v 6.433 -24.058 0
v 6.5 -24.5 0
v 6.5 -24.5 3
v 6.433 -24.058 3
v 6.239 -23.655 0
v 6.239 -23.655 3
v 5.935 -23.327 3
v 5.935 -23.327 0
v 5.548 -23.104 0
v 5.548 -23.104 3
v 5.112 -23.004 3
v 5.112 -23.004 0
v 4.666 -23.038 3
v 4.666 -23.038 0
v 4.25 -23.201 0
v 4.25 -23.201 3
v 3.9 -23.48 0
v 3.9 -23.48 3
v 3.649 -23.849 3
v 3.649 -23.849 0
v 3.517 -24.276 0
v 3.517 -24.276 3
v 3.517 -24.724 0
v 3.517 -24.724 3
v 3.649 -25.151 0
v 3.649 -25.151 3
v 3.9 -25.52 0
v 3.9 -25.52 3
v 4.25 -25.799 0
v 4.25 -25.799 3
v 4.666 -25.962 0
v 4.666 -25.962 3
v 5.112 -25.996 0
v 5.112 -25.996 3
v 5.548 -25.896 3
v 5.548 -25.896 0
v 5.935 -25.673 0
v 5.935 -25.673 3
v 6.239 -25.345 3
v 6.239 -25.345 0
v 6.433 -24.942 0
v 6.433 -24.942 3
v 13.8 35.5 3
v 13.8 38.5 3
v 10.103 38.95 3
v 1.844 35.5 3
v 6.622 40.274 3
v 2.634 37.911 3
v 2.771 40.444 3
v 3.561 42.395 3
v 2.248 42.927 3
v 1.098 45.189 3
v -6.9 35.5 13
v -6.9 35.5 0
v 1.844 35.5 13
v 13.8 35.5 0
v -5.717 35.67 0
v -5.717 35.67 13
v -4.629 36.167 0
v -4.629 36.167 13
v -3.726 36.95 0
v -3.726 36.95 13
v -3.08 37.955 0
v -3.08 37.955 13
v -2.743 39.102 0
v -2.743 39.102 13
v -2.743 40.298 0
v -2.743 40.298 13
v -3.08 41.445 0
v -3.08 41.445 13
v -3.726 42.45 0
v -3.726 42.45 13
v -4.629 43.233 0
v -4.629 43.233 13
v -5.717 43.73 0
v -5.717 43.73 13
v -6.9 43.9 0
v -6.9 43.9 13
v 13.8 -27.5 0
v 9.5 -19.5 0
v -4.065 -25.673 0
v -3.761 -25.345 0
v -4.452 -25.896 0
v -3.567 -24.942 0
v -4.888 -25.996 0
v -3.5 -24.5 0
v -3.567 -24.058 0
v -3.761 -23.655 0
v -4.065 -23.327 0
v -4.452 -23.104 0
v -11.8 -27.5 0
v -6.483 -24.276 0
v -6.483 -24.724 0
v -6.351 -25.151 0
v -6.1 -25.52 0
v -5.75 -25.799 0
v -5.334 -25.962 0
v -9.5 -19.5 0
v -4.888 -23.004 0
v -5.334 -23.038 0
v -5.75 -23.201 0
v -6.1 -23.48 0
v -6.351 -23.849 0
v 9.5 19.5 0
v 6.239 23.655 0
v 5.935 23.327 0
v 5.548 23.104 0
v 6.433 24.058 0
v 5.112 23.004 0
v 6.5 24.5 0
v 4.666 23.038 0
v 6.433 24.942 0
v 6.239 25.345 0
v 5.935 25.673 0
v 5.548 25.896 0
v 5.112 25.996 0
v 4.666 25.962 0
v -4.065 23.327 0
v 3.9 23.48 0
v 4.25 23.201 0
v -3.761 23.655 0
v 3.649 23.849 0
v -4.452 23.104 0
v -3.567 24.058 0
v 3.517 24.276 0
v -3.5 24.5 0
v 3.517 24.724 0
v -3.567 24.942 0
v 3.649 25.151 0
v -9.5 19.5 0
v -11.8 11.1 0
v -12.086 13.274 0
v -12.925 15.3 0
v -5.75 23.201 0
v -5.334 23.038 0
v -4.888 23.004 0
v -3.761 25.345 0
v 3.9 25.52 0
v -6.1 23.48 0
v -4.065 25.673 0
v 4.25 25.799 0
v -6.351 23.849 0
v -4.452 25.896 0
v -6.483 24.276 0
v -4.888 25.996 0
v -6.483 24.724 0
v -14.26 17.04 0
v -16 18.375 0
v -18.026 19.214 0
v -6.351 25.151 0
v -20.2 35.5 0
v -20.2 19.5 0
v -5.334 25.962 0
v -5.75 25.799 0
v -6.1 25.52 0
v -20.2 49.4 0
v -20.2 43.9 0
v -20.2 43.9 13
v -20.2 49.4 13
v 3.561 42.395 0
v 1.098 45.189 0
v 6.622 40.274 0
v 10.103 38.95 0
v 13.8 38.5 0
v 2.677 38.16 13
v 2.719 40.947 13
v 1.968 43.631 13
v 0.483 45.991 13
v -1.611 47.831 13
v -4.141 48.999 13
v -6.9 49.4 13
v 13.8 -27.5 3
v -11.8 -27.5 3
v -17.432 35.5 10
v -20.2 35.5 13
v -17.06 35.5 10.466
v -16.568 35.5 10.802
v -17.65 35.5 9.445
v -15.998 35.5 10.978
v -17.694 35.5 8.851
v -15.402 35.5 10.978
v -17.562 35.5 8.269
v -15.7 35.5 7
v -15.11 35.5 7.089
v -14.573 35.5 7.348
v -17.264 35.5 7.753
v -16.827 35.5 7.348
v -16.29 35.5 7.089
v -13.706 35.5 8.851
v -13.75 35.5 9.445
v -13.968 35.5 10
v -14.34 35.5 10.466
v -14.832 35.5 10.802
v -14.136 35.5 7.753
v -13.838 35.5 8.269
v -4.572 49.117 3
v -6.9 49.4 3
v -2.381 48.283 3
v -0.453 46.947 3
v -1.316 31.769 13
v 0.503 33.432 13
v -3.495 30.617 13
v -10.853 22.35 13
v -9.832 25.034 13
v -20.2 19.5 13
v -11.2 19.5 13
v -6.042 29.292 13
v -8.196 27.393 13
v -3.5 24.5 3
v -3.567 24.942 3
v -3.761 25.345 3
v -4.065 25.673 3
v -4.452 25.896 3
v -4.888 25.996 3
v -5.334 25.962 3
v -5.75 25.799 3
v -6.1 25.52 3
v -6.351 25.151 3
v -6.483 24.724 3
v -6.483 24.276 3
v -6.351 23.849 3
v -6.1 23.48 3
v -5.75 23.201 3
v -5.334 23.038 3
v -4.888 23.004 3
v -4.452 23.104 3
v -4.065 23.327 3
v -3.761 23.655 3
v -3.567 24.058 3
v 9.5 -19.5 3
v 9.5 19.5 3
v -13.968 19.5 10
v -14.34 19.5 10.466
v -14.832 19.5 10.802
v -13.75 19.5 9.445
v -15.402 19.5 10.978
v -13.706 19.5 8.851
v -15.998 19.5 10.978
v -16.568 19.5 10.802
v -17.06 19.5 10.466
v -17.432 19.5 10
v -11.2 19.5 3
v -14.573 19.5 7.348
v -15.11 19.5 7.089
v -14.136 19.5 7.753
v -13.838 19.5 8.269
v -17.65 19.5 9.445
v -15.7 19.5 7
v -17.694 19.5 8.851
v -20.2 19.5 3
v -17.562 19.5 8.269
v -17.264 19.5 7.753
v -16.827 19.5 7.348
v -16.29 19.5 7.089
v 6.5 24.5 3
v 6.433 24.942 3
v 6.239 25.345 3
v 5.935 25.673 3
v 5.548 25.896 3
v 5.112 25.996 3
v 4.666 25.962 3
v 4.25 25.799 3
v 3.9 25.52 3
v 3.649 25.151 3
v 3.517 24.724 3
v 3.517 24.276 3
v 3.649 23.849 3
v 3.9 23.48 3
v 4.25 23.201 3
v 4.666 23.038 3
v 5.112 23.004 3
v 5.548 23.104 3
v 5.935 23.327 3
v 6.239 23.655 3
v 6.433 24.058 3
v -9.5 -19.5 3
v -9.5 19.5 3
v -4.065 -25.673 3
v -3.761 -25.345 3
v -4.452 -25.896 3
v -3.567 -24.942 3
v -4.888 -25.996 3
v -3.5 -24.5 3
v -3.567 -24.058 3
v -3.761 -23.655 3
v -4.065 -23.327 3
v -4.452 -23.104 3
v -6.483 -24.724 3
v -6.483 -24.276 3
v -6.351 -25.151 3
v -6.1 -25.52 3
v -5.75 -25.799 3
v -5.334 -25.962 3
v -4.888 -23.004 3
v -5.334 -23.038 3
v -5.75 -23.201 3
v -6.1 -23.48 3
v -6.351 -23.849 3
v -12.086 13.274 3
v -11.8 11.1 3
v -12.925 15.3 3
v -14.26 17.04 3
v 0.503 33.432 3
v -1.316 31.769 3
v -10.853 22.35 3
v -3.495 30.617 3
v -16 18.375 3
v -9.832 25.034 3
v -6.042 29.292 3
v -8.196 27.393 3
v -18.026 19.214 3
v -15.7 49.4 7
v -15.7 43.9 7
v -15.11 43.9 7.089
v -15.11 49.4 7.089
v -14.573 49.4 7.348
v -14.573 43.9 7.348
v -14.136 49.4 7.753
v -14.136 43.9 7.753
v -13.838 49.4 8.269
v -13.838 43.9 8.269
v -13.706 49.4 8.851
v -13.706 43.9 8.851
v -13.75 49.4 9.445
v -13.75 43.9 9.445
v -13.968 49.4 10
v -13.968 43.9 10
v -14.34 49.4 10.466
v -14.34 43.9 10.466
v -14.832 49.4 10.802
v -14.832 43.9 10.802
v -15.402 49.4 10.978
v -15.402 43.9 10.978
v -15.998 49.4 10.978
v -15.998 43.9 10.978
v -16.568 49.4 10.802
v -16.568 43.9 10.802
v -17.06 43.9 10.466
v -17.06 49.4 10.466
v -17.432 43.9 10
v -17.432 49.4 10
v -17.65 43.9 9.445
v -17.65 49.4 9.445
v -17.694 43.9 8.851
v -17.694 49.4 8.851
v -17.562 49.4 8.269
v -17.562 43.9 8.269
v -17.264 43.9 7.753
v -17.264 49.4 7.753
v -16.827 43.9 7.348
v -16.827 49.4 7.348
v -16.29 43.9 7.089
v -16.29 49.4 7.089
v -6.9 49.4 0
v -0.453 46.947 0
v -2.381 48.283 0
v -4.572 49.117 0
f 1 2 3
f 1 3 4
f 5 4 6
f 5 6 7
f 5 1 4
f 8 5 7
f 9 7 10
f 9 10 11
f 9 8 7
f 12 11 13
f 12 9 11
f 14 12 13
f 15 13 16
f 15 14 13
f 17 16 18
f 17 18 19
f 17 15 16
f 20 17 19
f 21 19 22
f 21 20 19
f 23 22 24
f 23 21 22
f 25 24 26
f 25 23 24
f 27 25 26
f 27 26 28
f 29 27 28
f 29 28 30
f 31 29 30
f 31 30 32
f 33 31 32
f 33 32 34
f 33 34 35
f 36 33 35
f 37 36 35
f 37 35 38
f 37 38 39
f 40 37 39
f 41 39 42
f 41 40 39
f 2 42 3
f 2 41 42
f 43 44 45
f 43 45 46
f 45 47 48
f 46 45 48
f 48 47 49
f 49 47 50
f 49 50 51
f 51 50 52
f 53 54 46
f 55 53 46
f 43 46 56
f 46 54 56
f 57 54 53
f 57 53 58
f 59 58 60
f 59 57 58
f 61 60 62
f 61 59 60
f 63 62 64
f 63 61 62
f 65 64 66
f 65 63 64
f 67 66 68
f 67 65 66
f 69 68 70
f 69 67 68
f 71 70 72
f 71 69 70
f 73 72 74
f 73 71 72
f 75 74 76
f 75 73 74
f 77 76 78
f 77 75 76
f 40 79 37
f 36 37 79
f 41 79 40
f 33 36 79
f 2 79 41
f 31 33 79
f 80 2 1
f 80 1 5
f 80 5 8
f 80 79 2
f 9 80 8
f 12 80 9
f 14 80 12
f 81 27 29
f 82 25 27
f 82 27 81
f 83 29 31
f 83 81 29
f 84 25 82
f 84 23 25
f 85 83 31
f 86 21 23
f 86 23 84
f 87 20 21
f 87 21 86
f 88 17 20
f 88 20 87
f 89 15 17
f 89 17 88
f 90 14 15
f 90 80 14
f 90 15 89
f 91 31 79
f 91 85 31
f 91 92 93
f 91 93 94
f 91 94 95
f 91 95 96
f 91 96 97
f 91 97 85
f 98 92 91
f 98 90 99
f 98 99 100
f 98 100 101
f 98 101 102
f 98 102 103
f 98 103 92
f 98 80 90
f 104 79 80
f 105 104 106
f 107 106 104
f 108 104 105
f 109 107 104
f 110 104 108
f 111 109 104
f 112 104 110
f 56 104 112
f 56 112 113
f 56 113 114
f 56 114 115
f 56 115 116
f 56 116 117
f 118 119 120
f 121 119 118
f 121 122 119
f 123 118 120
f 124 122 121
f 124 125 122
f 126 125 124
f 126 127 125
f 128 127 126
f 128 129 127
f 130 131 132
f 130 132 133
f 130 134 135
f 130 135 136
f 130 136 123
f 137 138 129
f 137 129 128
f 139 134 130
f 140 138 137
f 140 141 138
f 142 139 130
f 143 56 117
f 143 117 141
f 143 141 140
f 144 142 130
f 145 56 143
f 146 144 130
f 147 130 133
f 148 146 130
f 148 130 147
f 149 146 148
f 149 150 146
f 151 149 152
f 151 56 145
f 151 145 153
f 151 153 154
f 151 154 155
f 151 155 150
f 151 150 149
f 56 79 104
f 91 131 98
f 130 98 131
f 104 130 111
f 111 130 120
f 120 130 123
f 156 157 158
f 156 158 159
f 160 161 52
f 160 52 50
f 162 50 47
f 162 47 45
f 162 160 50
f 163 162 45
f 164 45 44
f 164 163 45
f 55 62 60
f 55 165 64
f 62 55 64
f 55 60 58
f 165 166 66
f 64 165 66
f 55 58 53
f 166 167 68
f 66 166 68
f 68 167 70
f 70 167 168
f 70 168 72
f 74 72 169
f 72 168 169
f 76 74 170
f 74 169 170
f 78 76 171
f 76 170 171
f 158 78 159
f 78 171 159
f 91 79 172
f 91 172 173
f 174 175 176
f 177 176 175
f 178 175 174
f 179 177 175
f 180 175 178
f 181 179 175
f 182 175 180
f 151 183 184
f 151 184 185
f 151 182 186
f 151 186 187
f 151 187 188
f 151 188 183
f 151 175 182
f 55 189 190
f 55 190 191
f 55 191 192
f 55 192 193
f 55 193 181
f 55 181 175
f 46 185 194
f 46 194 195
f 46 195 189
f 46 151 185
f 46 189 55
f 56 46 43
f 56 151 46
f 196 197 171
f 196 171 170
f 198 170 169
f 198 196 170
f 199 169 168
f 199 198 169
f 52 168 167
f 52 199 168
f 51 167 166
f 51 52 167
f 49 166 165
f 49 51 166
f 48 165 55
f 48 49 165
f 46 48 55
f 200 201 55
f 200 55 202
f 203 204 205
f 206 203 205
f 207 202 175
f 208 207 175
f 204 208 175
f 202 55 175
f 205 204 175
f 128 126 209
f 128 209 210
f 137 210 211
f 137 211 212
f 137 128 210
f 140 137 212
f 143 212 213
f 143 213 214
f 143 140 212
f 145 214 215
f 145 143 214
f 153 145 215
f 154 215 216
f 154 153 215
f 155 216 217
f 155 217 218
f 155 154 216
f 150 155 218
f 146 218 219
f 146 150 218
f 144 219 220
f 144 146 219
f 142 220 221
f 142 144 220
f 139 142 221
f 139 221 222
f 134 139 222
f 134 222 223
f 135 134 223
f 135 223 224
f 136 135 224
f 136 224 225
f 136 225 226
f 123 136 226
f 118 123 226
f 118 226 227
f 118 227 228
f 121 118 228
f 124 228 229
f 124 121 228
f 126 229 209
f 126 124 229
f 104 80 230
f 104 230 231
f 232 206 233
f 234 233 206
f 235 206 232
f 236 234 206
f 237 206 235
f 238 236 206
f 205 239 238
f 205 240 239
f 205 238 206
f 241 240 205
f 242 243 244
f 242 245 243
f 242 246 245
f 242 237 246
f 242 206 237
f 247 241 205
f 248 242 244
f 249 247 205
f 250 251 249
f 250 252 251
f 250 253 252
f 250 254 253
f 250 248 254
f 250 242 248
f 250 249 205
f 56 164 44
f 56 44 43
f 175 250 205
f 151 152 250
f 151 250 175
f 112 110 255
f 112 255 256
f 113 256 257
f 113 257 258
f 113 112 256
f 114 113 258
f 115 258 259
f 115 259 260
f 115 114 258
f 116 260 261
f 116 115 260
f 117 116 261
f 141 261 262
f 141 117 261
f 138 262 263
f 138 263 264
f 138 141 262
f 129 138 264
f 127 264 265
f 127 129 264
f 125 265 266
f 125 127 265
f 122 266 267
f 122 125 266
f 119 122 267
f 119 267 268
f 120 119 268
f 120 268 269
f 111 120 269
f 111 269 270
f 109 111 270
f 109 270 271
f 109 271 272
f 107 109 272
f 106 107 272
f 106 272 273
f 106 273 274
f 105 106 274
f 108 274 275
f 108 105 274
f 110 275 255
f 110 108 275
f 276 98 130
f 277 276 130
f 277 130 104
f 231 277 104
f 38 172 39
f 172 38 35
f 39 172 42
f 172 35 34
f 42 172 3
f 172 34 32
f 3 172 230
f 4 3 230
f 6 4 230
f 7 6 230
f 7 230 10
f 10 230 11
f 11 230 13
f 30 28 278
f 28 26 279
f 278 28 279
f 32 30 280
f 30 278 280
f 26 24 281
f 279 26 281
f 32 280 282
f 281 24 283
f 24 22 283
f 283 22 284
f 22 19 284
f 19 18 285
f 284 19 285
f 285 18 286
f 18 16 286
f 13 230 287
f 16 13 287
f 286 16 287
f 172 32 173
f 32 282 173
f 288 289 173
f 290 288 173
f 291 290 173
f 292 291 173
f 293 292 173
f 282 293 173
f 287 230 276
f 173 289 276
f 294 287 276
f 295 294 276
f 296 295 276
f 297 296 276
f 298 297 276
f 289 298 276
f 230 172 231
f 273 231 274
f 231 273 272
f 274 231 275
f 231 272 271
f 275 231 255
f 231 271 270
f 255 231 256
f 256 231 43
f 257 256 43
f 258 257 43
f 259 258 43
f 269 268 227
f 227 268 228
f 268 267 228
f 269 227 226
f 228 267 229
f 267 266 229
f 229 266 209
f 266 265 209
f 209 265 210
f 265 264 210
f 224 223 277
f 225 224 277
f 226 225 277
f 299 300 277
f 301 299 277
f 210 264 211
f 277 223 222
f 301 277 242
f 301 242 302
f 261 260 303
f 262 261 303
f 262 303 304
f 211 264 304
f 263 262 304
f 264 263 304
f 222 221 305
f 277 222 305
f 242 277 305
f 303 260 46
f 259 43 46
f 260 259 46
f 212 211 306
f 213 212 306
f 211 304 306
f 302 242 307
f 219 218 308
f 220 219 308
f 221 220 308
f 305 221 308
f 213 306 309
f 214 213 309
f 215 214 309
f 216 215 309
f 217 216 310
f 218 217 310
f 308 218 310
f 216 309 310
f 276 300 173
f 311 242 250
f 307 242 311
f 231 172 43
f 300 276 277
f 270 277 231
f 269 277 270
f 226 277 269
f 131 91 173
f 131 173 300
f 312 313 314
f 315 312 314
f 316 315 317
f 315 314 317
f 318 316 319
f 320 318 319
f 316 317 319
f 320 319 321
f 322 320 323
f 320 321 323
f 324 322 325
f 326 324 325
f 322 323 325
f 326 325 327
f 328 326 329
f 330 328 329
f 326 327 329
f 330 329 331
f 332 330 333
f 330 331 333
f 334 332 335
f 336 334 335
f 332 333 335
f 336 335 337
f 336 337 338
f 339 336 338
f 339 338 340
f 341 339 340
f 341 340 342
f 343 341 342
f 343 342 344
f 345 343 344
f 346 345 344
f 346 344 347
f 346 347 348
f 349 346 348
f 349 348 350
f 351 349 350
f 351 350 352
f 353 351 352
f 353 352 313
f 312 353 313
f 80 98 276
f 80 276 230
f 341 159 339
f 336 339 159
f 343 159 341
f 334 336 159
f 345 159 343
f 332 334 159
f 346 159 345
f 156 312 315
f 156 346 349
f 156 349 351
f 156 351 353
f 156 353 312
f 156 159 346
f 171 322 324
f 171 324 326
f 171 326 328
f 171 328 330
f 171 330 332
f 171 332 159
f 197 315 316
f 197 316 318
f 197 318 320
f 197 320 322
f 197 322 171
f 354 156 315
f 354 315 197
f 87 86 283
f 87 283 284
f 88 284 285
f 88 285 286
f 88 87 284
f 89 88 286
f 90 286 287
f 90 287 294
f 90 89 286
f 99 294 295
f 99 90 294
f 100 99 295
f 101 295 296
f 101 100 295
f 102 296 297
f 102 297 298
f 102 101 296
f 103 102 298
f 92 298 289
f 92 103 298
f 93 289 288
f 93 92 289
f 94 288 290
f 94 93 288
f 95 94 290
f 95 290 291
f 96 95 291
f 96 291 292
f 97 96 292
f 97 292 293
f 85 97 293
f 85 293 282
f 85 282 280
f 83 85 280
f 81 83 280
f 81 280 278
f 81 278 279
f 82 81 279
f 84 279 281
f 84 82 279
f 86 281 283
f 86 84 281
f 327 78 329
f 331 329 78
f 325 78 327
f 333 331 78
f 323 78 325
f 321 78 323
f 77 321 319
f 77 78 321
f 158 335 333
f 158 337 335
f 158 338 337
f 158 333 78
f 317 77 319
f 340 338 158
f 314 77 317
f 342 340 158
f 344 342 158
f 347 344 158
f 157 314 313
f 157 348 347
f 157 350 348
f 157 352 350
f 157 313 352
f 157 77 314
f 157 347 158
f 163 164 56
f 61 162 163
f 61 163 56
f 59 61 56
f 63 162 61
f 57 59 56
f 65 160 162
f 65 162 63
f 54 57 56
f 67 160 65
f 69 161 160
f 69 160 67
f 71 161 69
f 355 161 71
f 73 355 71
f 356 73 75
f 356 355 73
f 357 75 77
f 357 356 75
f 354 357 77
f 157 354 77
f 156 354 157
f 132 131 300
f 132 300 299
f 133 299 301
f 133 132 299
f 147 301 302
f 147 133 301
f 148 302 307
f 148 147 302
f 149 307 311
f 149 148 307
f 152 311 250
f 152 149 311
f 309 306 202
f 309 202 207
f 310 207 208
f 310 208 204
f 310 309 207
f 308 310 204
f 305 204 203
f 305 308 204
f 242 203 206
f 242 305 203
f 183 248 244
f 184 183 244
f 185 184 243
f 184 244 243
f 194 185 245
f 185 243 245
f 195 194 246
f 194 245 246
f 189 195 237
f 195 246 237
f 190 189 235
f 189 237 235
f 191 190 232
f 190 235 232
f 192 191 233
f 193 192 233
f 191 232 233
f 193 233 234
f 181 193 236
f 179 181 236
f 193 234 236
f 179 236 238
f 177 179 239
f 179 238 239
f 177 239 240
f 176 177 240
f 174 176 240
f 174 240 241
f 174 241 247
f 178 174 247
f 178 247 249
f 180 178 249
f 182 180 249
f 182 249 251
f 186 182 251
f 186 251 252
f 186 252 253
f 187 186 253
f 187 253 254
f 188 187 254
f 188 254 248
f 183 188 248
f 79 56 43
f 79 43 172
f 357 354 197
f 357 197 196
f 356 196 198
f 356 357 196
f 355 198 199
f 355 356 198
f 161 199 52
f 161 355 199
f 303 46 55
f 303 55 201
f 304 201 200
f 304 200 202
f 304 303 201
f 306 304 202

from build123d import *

# Parameters (mm, degrees)
SKETCH_1_R             = 1.5
SKETCH_1_W             = 19
SKETCH_1_H             = 39
EXTRUDE_894_DEPTH      = 3
EXTRUDE_1415_DEPTH     = 10
CUT_EXTRUDE_1608_REACH = 54.783
SKETCH_3_R             = 2


# Read off the part's stored shape, not the designer's step: Разделить1
with BuildPart() as part:
    # Эскиз1 → Extrude 894 (new body)
    with BuildSketch(Plane.XY):
        with BuildLine():
            Line((-20.2, 19.5), (-20.2, 35.5))
            Line((-20.2, 35.5), (-6.9, 35.5))
            ThreePointArc((-6.9, 35.5), (-2.7, 39.7), (-6.9, 43.9))
            Line((-6.9, 43.9), (-20.2, 43.9))
            Line((-20.2, 43.9), (-20.2, 49.4))
            Line((-20.2, 49.4), (-6.9, 49.4))
            ThreePointArc((-6.9, 49.4), (-2.380550811, 48.282807176), (1.097847616, 45.188572995))
            ThreePointArc((1.097847616, 45.188572995), (6.622227297, 40.274321564), (13.8, 38.5))
            Line((13.8, 38.5), (13.8, -27.5))
            Line((13.8, -27.5), (-11.8, -27.5))
            Line((-11.8, -27.5), (-11.8, 11.1))
            ThreePointArc((-11.8, 11.1), (-14.260303038, 17.039696962), (-20.2, 19.5))
        make_face()
        with Locations((-5, 24.5)):
            Circle(SKETCH_1_R, mode=Mode.SUBTRACT)
        with Locations((5, 24.5)):
            Circle(SKETCH_1_R, mode=Mode.SUBTRACT)
        with Locations((-5, -24.5)):
            Circle(SKETCH_1_R, mode=Mode.SUBTRACT)
        with Locations((5, -24.5)):
            Circle(SKETCH_1_R, mode=Mode.SUBTRACT)
        Rectangle(SKETCH_1_W, SKETCH_1_H, mode=Mode.SUBTRACT)
    extrude(amount=EXTRUDE_894_DEPTH)

    # Эскиз2 → Extrude 1415 (add)
    with BuildSketch(Plane.XY.offset(3)):
        with BuildLine():
            Line((-20.2, 19.5), (-20.2, 35.5))
            Line((-20.2, 35.5), (-6.9, 35.5))
            ThreePointArc((-6.9, 35.5), (-2.7, 39.7), (-6.9, 43.9))
            Line((-6.9, 43.9), (-20.2, 43.9))
            Line((-20.2, 43.9), (-20.2, 49.4))
            Line((-20.2, 49.4), (-6.9, 49.4))
            ThreePointArc((-6.9, 49.4), (2.64442991, 41.430276767), (-3.494947354, 30.617290246))
            ThreePointArc((-3.494947354, 30.617290246), (-9.085433797, 26.263171938), (-11.2, 19.5))
            Line((-11.2, 19.5), (-20.2, 19.5))
        make_face()
    extrude(amount=EXTRUDE_1415_DEPTH)

    # Cut-Extrude 1608: up to this face of the body (flat: up to its plane)
    cut_extrude_1608_end = Plane(part.part.faces().sort_by_distance((-13.55, 49.4, 6.5))[0])
    # Эскиз3 → Cut-Extrude 1608 (cut, up to the picked face)
    with BuildSketch(Plane.XZ.offset(-19.5), mode=Mode.PRIVATE) as cut_extrude_1608_sk1:
        with Locations(Location((-15.7, 9, 0), (0, 0, 270))):
            Circle(SKETCH_3_R)
    cut_extrude_1608_tool1 = split(extrude(cut_extrude_1608_sk1.sketch, amount=-CUT_EXTRUDE_1608_REACH, mode=Mode.PRIVATE), bisect_by=cut_extrude_1608_end, keep=Keep.BOTH, mode=Mode.PRIVATE)
    add(cut_extrude_1608_tool1.solids().sort_by(Axis((-15.7, 19.5, 9), (0, 1, 0)))[0], mode=Mode.SUBTRACT)


with BuildPart() as body_2:
    # Split Bodies 1: the piece on the far side of the plane
    add(part.part)
    split(bisect_by=Plane(origin=(0, 35.5, 0), x_dir=(1, 0, 0), z_dir=(0, 1, 0)), keep=Keep.BOTTOM)


with BuildPart() as part_1:
    add(part.part)

    # Split Bodies 1
    split(bisect_by=Plane(origin=(0, 35.5, 0), x_dir=(1, 0, 0), z_dir=(0, 1, 0)), keep=Keep.TOP)


solid = Compound([body_2.part, part_1.part])
